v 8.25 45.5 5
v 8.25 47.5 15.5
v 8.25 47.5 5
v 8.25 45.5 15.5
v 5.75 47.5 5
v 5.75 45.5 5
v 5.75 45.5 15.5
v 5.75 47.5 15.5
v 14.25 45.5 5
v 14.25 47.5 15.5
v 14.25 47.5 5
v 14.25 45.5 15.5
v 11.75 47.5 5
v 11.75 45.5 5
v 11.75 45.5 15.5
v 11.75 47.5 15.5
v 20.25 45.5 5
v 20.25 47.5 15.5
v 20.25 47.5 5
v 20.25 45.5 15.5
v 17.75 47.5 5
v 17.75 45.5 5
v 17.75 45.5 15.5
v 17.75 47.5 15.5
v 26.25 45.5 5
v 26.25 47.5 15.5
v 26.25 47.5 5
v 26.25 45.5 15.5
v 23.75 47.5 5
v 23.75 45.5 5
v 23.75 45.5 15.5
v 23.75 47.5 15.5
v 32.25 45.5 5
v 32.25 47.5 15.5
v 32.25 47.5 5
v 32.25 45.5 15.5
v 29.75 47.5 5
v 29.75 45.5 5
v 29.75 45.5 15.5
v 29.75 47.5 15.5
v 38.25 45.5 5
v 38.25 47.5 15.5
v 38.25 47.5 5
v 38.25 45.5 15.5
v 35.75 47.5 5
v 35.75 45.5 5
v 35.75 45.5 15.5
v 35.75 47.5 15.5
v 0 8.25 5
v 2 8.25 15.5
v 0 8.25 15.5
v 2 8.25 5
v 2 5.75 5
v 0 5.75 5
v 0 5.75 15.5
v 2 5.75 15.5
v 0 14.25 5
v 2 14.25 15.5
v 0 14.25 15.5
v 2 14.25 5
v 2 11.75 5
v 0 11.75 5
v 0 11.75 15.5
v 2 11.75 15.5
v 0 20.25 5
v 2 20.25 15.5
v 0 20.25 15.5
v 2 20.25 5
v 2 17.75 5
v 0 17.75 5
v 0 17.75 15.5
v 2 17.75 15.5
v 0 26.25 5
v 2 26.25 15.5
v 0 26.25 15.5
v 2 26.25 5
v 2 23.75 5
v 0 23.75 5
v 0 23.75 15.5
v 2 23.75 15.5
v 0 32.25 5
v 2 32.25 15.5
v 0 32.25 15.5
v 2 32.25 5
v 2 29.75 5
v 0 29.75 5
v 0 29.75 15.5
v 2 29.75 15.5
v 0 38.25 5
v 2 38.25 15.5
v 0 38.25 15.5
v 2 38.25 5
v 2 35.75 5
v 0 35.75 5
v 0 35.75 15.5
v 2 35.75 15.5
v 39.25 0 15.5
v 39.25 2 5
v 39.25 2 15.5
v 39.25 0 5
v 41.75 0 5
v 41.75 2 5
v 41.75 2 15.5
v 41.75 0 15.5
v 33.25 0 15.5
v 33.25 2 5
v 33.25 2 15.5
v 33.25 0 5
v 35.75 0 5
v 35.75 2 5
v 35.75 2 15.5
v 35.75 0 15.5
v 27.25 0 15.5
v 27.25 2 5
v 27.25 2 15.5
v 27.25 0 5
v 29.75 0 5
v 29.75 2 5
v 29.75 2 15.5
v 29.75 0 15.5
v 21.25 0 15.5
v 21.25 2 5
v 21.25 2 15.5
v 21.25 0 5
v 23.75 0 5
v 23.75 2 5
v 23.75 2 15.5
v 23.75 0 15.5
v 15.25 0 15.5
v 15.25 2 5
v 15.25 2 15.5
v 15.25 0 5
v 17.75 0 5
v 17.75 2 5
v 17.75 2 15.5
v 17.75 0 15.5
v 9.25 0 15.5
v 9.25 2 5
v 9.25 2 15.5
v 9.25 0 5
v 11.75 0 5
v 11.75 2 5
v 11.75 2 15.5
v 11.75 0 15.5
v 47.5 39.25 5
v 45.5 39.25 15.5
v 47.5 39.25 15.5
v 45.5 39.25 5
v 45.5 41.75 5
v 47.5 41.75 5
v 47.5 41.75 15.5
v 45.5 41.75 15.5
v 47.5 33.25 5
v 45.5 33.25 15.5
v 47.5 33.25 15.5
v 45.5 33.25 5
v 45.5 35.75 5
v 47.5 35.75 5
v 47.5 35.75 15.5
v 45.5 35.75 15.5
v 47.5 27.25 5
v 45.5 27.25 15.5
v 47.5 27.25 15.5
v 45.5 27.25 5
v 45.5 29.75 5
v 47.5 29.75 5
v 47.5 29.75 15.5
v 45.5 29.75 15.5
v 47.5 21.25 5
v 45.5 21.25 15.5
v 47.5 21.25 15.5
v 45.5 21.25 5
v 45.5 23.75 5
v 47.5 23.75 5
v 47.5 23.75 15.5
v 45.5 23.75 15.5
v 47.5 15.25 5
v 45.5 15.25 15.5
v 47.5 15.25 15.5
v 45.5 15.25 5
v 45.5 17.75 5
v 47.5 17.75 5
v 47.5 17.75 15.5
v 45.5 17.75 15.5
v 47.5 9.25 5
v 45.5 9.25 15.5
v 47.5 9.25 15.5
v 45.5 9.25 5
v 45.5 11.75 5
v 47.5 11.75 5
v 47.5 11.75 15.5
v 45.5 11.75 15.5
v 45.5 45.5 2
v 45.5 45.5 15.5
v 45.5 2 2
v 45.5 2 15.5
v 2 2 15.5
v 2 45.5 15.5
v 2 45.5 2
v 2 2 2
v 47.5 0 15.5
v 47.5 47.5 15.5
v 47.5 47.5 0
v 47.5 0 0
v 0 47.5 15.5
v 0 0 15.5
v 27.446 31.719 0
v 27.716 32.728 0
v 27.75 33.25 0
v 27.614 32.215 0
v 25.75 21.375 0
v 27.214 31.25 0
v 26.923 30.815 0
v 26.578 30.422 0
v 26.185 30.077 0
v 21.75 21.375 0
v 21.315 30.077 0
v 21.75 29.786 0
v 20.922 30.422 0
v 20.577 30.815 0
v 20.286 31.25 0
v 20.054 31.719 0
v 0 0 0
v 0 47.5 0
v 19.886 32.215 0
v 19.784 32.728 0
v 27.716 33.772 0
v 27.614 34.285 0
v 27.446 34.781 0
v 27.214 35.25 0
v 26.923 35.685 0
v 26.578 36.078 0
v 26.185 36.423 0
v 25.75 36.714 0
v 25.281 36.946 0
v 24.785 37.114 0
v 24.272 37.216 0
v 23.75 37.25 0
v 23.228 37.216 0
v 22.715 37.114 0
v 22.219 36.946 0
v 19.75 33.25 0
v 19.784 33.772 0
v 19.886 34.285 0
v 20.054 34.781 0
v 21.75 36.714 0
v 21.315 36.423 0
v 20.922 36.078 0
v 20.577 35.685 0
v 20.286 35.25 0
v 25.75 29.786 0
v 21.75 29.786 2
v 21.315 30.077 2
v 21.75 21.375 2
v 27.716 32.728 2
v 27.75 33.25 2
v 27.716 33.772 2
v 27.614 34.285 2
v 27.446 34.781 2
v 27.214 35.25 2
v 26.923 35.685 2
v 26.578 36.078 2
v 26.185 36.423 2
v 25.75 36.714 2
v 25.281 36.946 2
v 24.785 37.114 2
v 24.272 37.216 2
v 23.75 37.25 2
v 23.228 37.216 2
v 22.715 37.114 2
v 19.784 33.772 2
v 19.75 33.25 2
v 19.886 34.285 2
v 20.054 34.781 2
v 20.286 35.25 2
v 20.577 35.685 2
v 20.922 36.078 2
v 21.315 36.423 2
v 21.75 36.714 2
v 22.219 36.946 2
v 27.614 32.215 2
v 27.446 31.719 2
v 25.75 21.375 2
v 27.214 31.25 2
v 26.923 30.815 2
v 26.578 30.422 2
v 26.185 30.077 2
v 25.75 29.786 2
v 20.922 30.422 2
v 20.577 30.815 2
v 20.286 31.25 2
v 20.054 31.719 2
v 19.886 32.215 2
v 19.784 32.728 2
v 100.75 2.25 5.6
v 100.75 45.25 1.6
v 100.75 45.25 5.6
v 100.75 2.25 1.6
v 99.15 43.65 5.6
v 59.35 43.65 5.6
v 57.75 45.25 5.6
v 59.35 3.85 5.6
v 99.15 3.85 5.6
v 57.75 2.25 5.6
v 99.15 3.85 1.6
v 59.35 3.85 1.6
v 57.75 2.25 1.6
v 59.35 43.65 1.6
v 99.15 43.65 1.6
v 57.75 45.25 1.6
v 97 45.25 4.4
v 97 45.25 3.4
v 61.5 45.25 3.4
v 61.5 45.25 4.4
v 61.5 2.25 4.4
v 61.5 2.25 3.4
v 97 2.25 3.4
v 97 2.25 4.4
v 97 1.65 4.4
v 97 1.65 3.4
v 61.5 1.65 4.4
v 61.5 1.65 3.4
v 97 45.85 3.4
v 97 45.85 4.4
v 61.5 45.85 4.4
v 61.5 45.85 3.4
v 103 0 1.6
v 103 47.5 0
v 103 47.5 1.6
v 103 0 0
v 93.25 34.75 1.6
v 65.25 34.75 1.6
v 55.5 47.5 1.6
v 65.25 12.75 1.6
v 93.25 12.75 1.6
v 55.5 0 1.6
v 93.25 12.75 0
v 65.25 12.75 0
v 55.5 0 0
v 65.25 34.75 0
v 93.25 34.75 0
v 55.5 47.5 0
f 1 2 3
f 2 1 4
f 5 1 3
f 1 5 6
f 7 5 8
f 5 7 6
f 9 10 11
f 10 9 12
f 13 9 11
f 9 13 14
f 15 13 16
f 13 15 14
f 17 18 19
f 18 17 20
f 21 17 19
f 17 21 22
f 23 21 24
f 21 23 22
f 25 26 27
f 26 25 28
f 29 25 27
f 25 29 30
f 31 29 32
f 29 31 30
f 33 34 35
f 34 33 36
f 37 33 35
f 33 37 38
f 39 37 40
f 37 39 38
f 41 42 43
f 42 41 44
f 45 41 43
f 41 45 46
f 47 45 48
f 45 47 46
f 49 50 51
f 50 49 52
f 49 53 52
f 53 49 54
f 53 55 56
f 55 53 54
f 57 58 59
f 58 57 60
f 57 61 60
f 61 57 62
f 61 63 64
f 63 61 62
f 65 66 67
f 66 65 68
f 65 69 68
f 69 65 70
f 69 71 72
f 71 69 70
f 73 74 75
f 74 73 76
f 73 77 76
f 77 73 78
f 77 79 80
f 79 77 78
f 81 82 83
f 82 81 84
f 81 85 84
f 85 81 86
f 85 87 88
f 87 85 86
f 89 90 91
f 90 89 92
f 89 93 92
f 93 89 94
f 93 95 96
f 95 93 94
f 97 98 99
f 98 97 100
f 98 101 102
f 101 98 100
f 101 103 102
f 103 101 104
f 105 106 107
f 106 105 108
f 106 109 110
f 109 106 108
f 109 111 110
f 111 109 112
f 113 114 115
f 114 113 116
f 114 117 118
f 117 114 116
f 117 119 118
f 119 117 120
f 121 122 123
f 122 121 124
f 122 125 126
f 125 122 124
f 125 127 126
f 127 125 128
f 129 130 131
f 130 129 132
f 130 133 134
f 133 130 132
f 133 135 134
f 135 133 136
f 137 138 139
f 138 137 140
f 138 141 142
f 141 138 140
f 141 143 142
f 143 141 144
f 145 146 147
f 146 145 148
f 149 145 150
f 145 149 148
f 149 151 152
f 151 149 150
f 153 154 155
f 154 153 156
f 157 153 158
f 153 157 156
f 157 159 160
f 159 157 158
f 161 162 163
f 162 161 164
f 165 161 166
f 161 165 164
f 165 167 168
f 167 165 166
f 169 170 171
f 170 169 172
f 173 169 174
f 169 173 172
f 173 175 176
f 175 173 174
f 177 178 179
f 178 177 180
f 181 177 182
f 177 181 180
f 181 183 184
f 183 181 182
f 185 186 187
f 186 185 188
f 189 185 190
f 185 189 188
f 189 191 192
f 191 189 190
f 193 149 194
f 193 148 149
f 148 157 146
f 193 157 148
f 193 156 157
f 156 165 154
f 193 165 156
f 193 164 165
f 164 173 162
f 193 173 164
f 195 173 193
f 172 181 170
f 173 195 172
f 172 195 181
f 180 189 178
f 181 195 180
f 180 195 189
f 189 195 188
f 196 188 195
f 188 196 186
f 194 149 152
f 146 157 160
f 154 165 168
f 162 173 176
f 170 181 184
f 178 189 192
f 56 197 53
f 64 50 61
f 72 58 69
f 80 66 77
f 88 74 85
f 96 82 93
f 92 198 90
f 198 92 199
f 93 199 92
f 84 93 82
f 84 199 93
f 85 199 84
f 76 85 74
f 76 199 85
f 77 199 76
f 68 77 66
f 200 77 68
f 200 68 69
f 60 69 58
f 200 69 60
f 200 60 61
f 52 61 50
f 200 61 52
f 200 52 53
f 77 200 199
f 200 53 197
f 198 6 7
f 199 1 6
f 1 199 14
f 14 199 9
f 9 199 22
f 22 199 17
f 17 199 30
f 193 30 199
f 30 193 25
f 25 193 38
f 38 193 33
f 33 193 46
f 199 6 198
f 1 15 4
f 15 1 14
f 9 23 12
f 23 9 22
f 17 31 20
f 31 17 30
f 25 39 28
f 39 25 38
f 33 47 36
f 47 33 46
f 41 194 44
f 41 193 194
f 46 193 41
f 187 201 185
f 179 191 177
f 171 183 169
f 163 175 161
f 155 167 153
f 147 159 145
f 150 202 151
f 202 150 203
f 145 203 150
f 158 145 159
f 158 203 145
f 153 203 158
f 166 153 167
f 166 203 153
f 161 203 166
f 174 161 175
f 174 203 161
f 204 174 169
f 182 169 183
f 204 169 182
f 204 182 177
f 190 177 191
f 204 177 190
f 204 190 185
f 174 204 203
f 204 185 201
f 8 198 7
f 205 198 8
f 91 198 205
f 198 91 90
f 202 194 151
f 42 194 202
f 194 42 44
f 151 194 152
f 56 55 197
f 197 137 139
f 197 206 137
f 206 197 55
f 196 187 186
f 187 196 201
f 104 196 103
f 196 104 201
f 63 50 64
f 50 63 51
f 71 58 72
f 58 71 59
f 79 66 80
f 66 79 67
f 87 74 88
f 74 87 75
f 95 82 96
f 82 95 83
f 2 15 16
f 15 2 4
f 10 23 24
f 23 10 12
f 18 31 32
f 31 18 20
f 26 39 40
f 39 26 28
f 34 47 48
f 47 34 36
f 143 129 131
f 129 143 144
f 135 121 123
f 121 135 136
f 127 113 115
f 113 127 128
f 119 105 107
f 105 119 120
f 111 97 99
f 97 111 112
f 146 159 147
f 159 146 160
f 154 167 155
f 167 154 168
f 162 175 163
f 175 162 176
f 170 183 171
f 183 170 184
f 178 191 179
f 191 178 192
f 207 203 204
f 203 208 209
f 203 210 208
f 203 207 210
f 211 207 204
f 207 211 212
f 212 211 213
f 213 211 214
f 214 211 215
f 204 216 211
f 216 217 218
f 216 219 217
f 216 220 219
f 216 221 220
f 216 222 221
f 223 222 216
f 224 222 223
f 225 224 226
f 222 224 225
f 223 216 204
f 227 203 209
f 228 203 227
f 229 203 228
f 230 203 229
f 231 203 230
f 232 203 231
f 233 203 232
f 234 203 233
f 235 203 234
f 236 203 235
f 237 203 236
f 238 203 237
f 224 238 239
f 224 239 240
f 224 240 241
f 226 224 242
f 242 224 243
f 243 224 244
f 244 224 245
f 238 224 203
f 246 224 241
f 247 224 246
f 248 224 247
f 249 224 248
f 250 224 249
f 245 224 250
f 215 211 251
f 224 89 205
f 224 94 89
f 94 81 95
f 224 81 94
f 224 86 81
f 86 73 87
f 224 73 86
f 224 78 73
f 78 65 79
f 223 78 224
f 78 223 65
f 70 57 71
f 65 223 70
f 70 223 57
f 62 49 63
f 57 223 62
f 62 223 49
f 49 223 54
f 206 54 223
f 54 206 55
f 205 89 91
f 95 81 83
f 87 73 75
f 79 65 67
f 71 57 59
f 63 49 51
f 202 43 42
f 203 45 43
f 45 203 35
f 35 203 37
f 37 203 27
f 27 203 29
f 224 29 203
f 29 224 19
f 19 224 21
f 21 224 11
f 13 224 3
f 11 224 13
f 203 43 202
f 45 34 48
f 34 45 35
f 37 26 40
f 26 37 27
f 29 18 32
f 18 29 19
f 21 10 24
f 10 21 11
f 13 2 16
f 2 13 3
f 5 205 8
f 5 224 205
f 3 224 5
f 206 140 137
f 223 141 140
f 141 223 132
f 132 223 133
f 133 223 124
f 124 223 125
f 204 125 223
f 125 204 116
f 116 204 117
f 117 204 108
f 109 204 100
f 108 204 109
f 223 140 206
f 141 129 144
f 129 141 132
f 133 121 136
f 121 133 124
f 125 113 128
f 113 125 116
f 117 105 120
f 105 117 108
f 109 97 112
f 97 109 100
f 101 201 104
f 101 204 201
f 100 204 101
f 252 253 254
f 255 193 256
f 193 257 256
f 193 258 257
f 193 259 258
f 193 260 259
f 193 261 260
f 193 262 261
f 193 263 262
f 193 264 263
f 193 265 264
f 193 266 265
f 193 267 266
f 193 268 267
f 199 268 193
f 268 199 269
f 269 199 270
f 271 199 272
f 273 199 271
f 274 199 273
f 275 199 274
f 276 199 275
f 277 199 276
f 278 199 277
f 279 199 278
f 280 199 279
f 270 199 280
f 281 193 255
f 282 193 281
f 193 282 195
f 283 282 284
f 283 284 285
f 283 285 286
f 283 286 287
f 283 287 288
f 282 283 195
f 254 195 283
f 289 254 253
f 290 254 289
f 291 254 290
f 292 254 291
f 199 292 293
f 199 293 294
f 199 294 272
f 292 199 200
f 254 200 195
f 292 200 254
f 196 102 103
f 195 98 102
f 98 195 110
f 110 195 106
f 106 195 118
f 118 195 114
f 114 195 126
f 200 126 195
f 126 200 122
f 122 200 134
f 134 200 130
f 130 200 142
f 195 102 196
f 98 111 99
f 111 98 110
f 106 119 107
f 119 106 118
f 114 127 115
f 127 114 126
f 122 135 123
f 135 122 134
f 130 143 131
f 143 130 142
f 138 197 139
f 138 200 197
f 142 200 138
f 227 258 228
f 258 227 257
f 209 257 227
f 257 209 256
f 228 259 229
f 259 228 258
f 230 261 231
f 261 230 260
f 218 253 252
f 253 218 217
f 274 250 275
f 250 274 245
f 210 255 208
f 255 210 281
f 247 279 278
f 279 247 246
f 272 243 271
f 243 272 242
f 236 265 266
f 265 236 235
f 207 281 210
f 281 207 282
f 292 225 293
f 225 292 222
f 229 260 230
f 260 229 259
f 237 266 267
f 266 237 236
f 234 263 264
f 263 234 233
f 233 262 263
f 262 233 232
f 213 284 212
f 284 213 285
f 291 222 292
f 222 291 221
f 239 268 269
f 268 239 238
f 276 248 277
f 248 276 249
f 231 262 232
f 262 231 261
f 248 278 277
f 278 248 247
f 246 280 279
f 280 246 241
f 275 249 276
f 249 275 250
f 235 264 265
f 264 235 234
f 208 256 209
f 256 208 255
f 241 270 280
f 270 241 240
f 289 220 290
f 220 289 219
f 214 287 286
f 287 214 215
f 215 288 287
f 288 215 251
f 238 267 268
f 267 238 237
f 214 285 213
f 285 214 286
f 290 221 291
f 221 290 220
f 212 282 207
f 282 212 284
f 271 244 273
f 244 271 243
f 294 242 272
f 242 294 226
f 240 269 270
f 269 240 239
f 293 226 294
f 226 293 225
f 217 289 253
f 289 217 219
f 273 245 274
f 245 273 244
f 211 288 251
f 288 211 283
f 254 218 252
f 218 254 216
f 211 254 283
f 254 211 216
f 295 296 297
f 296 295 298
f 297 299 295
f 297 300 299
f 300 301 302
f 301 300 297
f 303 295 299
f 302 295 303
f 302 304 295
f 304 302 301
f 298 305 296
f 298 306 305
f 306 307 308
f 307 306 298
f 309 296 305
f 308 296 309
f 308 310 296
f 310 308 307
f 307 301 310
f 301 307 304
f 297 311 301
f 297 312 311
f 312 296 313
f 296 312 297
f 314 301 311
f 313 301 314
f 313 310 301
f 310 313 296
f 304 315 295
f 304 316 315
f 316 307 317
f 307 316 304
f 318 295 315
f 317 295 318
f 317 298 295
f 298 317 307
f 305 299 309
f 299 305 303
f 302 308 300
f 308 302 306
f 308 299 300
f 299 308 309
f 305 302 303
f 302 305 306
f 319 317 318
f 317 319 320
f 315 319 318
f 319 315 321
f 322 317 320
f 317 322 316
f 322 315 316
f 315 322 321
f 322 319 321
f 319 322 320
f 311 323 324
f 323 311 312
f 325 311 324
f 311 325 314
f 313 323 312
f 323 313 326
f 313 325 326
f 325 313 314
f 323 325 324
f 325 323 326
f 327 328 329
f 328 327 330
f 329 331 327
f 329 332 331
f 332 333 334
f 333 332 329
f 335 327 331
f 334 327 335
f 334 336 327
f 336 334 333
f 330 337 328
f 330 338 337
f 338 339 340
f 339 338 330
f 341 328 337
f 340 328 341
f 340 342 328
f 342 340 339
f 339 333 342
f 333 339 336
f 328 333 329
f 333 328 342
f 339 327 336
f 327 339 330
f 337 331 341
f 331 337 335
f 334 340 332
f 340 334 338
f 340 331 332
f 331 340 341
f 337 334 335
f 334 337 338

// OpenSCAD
// Vented, peck-proof case for a Xiaomi LYWSD03MMC BLE thermometer (pvvx firmware), for
// the nest-box row or brooder. Slots let air through but are narrow enough to stop
// beaks, and a keyhole on the back hangs it on a screw.
// Print: PETG, 3 perimeters, 20% infill, no supports. Snap lid.

part = "all";   // "base" | "lid" | "all"
$fn = 48;

sensor = [43.5, 43.5, 13.5];   // LYWSD03MMC body + clearance
wall = 2;
slot_w = 2.5;
slot_pitch = 6;
inner = sensor;
outer = [inner[0] + 2 * wall, inner[1] + 2 * wall, inner[2] + wall];

module vents(len, n) {
    for (i = [0 : n - 1]) translate([i * slot_pitch, 0, 0]) cube([slot_w, len, 50]);
}

module base() {
    difference() {
        cube(outer);
        translate([wall, wall, wall]) cube([inner[0], inner[1], inner[2] + 1]);
        // side vent slots (all four walls)
        n = floor((inner[0] - 6) / slot_pitch);
        for (r = [0, 90, 180, 270])
            translate([outer[0] / 2, outer[1] / 2, 0]) rotate([0, 0, r])
                translate([-n * slot_pitch / 2, outer[1] / 2 - wall - 1, wall + 3])
                    vents(wall + 2, n);
        // keyhole on the back (floor)
        translate([outer[0] / 2, outer[1] * 0.7, -1]) cylinder(d = 8, h = wall + 2);
        translate([outer[0] / 2 - 2, outer[1] * 0.45, -1]) cube([4, outer[1] * 0.25, wall + 2]);
        // snap grooves
        for (y = [wall + 0.01, outer[1] - wall - 0.8])
            translate([wall, y, outer[2] - 3]) cube([inner[0], 0.8, 1.2]);
    }
}

module lid() {
    difference() {
        union() {
            cube([outer[0], outer[1], 1.6]);
            translate([wall + 0.25, wall + 0.25, 1.6]) difference() {
                cube([inner[0] - 0.5, inner[1] - 0.5, 4]);
                translate([1.6, 1.6, -1]) cube([inner[0] - 3.7, inner[1] - 3.7, 6]);
            }
            // snap bumps
            for (y = [wall + 0.25 - 0.6, outer[1] - wall - 0.25])
                translate([wall + 4, y, 3.4]) cube([inner[0] - 8, 0.6, 1]);
        }
        // viewing window so the display is readable
        translate([outer[0] / 2 - 14, outer[1] / 2 - 11, -1]) cube([28, 22, 4]);
    }
}

if (part == "base") base();
else if (part == "lid") lid();
else { base(); translate([outer[0] + 8, 0, 0]) lid(); }
